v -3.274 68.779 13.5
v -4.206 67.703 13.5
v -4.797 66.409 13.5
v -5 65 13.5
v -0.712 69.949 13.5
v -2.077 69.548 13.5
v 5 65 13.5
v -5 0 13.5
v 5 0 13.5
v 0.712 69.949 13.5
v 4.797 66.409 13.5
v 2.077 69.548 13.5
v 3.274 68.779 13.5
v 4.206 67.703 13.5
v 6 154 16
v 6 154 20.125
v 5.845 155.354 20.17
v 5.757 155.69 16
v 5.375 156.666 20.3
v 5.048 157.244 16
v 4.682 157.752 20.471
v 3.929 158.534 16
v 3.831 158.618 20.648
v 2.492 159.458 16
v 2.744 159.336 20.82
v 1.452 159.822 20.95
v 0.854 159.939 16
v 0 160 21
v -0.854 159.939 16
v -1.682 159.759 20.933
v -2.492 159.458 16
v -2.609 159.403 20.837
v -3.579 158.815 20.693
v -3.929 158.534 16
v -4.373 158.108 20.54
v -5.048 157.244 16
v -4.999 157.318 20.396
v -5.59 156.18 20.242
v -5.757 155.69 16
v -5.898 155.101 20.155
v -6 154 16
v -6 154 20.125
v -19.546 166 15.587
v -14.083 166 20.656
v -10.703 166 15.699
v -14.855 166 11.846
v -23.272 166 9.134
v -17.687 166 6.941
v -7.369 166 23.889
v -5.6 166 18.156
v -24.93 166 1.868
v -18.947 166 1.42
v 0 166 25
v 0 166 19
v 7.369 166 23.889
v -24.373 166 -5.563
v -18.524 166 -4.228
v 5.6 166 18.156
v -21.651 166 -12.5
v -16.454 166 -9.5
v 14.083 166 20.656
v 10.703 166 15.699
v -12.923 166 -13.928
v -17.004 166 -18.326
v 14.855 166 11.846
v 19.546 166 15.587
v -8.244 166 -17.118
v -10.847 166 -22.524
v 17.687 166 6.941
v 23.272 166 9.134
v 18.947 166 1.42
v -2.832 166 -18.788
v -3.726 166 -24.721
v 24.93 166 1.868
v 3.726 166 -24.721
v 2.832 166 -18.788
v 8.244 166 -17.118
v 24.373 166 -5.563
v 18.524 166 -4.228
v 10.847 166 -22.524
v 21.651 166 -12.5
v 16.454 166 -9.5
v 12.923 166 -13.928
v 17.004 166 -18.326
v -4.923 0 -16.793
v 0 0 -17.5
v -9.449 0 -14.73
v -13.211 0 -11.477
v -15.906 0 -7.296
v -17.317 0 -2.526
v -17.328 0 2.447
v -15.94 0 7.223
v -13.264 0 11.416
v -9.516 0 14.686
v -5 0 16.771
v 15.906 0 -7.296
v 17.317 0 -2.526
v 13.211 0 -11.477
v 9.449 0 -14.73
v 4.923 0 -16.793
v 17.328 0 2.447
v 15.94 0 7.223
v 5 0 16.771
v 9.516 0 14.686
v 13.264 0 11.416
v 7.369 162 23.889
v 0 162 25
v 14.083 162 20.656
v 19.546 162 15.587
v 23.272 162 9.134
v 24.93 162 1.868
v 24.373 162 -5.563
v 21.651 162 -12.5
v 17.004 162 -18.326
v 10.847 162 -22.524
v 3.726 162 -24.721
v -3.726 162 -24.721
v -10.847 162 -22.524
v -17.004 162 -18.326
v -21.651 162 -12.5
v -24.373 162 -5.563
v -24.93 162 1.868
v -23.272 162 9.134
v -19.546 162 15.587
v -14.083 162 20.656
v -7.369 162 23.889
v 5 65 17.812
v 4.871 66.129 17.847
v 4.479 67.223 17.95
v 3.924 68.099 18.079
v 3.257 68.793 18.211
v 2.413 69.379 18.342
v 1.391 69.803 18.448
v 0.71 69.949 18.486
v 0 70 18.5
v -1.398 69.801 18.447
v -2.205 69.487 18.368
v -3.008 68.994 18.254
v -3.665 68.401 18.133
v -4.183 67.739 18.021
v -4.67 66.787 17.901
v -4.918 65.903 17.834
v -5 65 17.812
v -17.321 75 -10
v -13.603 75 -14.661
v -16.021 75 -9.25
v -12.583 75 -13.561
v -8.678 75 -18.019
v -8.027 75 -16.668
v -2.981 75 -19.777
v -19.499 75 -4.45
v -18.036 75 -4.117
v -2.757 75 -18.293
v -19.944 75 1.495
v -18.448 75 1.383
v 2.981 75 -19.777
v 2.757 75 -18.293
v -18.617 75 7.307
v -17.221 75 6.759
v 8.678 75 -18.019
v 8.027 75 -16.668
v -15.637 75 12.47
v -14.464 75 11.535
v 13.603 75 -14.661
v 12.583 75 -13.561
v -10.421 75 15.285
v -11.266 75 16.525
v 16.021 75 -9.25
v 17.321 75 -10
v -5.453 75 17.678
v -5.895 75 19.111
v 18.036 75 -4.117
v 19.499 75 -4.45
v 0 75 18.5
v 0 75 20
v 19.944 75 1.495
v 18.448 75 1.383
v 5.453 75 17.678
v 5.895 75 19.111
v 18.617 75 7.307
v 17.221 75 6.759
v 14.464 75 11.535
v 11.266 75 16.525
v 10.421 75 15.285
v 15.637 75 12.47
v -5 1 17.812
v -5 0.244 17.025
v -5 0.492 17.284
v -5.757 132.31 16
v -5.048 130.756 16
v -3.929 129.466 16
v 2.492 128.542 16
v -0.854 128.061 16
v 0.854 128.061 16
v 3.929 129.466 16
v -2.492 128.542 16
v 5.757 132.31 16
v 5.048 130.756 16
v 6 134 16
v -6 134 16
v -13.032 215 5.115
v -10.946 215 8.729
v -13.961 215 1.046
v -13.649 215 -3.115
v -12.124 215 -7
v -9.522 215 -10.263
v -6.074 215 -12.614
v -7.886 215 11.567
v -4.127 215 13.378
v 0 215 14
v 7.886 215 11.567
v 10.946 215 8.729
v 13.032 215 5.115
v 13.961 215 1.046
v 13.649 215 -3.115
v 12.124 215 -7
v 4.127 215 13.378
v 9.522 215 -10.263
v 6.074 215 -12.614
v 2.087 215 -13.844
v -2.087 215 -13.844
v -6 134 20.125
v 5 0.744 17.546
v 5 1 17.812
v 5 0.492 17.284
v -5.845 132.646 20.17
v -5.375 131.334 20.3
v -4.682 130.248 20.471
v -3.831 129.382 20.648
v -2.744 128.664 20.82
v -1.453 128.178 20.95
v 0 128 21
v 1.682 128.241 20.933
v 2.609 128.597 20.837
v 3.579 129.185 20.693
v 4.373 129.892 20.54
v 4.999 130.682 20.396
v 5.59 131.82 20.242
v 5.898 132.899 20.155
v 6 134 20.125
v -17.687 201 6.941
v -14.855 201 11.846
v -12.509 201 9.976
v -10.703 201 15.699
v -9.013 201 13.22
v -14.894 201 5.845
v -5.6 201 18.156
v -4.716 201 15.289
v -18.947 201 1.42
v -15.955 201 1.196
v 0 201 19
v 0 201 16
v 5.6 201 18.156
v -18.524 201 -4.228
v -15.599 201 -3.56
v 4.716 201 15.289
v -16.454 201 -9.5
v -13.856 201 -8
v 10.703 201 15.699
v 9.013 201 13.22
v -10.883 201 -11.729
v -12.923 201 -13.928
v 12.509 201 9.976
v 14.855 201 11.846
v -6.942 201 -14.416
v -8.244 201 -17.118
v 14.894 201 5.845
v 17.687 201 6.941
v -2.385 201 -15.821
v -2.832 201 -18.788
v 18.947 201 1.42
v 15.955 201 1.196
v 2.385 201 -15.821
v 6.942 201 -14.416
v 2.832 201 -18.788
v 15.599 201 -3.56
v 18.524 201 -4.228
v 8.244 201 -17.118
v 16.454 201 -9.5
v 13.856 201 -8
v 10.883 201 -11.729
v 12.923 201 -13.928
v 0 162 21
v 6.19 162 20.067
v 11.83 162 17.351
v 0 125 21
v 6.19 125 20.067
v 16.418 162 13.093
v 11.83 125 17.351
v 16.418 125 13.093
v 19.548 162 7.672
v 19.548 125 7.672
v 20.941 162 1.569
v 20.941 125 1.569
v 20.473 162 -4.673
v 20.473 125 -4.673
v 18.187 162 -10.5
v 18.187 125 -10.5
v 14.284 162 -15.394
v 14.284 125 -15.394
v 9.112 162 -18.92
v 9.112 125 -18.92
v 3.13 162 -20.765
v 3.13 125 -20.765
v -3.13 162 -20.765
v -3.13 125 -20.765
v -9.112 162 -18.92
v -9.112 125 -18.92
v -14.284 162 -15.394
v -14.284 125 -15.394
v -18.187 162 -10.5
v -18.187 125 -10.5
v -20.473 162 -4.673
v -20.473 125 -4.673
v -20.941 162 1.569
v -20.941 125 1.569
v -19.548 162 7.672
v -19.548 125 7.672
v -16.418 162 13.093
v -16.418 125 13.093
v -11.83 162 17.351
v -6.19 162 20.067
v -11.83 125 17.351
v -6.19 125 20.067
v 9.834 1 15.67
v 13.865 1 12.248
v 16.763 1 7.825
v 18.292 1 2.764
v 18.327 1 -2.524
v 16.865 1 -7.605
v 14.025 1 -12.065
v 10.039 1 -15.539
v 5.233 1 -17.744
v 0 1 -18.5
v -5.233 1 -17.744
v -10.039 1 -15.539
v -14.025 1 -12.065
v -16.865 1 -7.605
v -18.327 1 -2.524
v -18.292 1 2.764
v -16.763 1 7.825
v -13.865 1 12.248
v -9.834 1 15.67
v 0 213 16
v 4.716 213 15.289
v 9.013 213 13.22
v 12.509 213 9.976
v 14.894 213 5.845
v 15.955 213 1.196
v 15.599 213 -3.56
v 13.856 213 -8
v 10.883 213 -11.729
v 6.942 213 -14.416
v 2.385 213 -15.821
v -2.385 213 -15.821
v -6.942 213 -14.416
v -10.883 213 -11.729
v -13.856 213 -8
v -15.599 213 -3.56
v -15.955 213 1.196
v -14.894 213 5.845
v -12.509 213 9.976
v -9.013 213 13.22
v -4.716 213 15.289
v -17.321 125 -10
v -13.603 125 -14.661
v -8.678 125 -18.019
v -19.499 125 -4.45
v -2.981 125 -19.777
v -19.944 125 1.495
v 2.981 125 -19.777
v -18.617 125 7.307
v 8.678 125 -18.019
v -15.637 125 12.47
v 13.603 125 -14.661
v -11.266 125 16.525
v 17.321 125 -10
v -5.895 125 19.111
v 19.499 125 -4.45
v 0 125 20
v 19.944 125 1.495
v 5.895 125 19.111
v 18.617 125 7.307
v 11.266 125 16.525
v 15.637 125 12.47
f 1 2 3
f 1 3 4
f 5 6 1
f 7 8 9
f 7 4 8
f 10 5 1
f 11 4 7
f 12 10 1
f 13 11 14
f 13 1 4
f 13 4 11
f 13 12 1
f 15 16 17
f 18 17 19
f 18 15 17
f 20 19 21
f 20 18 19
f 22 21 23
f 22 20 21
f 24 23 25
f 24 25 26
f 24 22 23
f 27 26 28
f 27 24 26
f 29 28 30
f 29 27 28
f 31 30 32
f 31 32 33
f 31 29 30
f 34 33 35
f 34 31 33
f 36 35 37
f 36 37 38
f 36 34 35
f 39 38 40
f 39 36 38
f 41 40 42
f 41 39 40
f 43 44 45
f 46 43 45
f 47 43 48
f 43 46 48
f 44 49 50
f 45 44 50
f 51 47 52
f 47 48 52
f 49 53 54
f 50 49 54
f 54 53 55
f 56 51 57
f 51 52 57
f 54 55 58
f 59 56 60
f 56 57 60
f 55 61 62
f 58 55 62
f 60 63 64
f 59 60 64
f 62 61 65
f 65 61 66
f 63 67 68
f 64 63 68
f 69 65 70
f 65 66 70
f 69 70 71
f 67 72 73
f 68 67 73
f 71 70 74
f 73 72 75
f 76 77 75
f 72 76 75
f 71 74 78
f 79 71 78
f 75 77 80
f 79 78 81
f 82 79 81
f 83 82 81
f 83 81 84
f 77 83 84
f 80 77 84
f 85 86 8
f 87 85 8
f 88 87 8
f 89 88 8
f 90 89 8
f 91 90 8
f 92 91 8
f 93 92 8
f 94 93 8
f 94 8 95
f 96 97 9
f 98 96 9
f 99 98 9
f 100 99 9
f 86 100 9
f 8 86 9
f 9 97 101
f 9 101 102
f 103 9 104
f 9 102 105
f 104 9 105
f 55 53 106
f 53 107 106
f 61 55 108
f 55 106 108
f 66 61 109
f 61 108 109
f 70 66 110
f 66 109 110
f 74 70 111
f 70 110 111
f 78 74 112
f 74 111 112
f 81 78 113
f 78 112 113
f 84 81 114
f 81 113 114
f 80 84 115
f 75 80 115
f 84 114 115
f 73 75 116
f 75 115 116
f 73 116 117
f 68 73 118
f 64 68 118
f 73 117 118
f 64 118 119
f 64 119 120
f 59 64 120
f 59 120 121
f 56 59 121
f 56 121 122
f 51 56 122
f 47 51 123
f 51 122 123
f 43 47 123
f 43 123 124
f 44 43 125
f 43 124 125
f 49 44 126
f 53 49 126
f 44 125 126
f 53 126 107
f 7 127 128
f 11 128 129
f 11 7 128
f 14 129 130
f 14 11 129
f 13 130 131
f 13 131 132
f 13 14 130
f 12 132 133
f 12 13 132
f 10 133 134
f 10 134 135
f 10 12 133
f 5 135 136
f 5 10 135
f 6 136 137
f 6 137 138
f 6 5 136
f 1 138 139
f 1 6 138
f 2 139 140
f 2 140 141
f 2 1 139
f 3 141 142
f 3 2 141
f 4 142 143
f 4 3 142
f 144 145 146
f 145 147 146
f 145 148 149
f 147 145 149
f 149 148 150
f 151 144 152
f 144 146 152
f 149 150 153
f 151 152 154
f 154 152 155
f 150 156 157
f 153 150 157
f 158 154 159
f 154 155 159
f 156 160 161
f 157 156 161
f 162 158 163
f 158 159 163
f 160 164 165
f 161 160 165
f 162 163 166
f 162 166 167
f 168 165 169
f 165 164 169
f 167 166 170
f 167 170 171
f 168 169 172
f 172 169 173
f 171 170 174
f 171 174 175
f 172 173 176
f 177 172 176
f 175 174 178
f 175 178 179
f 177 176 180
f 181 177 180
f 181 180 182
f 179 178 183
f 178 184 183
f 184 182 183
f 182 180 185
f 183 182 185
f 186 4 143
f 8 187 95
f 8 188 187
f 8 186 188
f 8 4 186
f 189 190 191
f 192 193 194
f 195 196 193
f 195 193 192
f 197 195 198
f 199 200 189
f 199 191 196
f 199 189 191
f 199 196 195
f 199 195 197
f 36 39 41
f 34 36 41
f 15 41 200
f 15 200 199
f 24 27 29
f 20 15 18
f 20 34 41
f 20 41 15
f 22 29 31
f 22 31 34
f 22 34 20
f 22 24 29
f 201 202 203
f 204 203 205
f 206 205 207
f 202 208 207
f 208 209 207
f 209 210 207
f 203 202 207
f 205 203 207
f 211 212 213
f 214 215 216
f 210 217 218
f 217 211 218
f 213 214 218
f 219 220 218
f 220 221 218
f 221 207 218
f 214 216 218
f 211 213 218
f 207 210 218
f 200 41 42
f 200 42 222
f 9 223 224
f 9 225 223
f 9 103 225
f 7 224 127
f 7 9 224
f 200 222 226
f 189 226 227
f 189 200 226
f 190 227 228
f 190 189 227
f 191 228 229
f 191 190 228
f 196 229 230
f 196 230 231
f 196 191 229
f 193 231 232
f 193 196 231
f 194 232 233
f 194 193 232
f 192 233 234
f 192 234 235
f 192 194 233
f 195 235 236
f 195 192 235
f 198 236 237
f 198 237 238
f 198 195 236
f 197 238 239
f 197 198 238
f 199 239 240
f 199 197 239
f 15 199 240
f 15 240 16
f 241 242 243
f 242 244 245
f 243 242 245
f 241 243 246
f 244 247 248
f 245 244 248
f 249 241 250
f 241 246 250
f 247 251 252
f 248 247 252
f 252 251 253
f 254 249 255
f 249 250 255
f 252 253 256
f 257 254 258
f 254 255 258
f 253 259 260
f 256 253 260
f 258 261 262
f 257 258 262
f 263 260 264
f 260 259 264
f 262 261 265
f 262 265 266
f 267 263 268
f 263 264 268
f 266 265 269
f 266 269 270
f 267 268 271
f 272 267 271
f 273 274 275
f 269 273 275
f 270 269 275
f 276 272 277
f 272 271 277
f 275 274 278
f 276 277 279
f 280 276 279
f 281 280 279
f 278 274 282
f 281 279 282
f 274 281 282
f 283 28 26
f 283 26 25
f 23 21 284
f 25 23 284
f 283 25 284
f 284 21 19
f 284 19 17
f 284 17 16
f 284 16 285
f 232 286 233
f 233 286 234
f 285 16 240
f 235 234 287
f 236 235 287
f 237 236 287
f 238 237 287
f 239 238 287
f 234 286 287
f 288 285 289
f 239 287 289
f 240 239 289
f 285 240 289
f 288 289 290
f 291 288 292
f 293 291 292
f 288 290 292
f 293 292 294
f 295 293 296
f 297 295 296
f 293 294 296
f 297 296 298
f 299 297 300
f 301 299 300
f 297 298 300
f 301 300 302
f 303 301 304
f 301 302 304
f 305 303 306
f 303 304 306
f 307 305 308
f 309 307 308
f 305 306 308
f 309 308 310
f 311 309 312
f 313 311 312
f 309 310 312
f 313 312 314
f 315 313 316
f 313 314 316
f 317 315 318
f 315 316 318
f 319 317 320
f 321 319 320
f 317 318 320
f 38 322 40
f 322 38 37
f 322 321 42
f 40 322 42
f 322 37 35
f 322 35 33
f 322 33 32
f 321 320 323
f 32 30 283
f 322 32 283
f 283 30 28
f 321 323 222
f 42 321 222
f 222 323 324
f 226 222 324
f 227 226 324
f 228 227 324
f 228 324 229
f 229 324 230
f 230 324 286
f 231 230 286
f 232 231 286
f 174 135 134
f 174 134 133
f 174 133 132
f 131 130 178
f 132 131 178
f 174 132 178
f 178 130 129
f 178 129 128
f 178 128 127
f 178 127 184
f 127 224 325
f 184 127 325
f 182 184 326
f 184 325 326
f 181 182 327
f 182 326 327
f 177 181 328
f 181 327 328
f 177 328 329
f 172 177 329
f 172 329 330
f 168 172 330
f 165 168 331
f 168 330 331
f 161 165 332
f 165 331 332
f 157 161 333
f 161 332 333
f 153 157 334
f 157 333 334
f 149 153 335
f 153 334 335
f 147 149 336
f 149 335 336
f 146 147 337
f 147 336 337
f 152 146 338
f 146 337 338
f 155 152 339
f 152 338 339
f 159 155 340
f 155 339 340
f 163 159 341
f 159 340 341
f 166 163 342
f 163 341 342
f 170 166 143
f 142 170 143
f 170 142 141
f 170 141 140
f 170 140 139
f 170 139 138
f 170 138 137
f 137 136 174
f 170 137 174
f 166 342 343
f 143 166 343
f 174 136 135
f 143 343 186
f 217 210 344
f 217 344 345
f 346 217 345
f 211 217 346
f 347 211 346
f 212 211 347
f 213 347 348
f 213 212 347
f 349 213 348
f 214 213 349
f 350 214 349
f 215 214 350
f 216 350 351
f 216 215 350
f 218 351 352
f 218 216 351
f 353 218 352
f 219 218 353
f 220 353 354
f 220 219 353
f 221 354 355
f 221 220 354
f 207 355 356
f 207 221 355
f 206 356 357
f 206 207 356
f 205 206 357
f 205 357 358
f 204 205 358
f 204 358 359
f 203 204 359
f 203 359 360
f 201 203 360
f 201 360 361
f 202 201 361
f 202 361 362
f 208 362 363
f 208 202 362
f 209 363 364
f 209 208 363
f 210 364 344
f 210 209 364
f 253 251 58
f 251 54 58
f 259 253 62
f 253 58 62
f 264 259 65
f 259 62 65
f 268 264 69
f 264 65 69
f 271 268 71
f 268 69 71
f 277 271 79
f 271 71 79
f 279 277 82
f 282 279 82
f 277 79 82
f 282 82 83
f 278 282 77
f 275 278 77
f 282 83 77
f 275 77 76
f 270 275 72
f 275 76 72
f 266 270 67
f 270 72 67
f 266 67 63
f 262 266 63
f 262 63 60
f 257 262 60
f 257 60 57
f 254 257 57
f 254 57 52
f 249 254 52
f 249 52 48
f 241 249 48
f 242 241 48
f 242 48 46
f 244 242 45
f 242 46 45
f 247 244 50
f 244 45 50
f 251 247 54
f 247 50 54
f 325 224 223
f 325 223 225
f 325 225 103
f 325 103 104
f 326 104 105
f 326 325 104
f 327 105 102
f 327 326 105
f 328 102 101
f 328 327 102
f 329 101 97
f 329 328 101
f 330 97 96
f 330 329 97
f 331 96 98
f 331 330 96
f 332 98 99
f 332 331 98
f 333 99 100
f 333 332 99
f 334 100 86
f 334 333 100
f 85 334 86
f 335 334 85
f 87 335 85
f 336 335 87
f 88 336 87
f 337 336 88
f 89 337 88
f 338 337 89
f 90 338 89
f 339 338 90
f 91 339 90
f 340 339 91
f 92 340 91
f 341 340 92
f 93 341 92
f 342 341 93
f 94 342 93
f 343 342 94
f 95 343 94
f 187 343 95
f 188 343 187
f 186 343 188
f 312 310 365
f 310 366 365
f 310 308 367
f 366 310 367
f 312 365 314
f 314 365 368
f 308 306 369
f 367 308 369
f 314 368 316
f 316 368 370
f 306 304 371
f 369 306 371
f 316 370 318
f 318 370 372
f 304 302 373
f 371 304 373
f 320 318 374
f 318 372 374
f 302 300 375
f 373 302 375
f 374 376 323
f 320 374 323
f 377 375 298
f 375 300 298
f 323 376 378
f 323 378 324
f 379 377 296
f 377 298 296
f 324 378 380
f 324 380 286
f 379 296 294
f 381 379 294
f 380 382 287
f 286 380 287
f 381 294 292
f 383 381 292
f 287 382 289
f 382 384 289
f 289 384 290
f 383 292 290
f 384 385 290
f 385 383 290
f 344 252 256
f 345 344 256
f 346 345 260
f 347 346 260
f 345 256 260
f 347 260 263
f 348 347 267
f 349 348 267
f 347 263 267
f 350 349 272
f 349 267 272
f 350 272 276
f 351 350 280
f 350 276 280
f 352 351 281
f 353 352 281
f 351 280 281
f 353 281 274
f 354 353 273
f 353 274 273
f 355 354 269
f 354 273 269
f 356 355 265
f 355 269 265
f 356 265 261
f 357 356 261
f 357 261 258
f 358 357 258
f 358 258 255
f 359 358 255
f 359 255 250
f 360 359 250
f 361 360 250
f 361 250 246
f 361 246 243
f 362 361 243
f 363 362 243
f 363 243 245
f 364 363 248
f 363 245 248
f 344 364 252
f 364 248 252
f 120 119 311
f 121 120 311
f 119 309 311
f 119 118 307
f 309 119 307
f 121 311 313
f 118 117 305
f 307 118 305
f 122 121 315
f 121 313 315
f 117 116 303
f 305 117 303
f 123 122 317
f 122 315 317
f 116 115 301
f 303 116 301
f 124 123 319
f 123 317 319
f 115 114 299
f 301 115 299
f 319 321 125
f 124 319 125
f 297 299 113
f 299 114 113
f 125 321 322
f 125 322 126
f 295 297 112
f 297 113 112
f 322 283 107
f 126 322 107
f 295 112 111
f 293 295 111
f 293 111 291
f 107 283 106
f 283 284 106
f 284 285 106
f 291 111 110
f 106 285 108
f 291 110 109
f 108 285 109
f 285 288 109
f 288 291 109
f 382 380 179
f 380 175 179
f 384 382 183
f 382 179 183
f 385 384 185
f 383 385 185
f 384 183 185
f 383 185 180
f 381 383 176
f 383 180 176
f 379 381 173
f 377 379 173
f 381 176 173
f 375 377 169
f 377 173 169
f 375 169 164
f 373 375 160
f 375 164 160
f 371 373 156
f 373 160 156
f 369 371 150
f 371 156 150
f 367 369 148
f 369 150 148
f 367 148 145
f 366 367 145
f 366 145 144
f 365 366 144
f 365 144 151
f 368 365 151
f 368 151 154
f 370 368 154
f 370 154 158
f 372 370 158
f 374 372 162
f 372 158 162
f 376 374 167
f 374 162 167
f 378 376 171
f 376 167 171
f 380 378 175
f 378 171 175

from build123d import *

# Parameters (mm, degrees)
F2_SIZE  = 1
F3_SIZE  = 2
F6_DEPTH = 11.501
F9_DEPTH = 9.001


with BuildPart() as f1:
    # F0 (on Right) → F1 (revolve)
    with BuildSketch(Plane.YZ):
        Polygon((0, 18.5), (0, 0), (215, 0), (215, 16), (201, 16), (201, 19), (166, 19), (166, 25), (162, 25), (162, 21), (125, 21), (125, 20), (75, 20), (75, 18.5), align=None)
    revolve(axis=Axis((0, 105.03928, 0), (0, 1, 0)))

    # F2
    f2_edges = [f1.edges().sort_by_distance(p)[0] for p in [
        (0, 0, -18.5),
    ]]
    chamfer(f2_edges, length=F2_SIZE)

    # F3
    f3_edges = [f1.edges().sort_by_distance(p)[0] for p in [
        (0, 215, -16),
    ]]
    chamfer(f3_edges, length=F3_SIZE)

    # F5 (on offset) → F6 (cut, through all)
    with BuildSketch(Plane.XY.offset(13.5)):
        with BuildLine():
            Line((5, -5), (5, 65))
            ThreePointArc((5, 65), (0, 70), (-5, 65))
            Line((-5, 65), (-5, -5))
            Line((-5, -5), (0, -5))
            Line((0, -5), (5, -5))
        make_face()
    extrude(amount=F6_DEPTH, mode=Mode.SUBTRACT)

    # F8 (on offset) → F9 (cut, through all)
    with BuildSketch(Plane.XY.offset(16)):
        with BuildLine():
            Line((6, 134), (6, 154))
            ThreePointArc((6, 154), (0, 160), (-6, 154))
            Line((-6, 154), (-6, 134))
            ThreePointArc((-6, 134), (0, 128), (6, 134))
        make_face()
    extrude(amount=F9_DEPTH, mode=Mode.SUBTRACT)


solid = f1.part
